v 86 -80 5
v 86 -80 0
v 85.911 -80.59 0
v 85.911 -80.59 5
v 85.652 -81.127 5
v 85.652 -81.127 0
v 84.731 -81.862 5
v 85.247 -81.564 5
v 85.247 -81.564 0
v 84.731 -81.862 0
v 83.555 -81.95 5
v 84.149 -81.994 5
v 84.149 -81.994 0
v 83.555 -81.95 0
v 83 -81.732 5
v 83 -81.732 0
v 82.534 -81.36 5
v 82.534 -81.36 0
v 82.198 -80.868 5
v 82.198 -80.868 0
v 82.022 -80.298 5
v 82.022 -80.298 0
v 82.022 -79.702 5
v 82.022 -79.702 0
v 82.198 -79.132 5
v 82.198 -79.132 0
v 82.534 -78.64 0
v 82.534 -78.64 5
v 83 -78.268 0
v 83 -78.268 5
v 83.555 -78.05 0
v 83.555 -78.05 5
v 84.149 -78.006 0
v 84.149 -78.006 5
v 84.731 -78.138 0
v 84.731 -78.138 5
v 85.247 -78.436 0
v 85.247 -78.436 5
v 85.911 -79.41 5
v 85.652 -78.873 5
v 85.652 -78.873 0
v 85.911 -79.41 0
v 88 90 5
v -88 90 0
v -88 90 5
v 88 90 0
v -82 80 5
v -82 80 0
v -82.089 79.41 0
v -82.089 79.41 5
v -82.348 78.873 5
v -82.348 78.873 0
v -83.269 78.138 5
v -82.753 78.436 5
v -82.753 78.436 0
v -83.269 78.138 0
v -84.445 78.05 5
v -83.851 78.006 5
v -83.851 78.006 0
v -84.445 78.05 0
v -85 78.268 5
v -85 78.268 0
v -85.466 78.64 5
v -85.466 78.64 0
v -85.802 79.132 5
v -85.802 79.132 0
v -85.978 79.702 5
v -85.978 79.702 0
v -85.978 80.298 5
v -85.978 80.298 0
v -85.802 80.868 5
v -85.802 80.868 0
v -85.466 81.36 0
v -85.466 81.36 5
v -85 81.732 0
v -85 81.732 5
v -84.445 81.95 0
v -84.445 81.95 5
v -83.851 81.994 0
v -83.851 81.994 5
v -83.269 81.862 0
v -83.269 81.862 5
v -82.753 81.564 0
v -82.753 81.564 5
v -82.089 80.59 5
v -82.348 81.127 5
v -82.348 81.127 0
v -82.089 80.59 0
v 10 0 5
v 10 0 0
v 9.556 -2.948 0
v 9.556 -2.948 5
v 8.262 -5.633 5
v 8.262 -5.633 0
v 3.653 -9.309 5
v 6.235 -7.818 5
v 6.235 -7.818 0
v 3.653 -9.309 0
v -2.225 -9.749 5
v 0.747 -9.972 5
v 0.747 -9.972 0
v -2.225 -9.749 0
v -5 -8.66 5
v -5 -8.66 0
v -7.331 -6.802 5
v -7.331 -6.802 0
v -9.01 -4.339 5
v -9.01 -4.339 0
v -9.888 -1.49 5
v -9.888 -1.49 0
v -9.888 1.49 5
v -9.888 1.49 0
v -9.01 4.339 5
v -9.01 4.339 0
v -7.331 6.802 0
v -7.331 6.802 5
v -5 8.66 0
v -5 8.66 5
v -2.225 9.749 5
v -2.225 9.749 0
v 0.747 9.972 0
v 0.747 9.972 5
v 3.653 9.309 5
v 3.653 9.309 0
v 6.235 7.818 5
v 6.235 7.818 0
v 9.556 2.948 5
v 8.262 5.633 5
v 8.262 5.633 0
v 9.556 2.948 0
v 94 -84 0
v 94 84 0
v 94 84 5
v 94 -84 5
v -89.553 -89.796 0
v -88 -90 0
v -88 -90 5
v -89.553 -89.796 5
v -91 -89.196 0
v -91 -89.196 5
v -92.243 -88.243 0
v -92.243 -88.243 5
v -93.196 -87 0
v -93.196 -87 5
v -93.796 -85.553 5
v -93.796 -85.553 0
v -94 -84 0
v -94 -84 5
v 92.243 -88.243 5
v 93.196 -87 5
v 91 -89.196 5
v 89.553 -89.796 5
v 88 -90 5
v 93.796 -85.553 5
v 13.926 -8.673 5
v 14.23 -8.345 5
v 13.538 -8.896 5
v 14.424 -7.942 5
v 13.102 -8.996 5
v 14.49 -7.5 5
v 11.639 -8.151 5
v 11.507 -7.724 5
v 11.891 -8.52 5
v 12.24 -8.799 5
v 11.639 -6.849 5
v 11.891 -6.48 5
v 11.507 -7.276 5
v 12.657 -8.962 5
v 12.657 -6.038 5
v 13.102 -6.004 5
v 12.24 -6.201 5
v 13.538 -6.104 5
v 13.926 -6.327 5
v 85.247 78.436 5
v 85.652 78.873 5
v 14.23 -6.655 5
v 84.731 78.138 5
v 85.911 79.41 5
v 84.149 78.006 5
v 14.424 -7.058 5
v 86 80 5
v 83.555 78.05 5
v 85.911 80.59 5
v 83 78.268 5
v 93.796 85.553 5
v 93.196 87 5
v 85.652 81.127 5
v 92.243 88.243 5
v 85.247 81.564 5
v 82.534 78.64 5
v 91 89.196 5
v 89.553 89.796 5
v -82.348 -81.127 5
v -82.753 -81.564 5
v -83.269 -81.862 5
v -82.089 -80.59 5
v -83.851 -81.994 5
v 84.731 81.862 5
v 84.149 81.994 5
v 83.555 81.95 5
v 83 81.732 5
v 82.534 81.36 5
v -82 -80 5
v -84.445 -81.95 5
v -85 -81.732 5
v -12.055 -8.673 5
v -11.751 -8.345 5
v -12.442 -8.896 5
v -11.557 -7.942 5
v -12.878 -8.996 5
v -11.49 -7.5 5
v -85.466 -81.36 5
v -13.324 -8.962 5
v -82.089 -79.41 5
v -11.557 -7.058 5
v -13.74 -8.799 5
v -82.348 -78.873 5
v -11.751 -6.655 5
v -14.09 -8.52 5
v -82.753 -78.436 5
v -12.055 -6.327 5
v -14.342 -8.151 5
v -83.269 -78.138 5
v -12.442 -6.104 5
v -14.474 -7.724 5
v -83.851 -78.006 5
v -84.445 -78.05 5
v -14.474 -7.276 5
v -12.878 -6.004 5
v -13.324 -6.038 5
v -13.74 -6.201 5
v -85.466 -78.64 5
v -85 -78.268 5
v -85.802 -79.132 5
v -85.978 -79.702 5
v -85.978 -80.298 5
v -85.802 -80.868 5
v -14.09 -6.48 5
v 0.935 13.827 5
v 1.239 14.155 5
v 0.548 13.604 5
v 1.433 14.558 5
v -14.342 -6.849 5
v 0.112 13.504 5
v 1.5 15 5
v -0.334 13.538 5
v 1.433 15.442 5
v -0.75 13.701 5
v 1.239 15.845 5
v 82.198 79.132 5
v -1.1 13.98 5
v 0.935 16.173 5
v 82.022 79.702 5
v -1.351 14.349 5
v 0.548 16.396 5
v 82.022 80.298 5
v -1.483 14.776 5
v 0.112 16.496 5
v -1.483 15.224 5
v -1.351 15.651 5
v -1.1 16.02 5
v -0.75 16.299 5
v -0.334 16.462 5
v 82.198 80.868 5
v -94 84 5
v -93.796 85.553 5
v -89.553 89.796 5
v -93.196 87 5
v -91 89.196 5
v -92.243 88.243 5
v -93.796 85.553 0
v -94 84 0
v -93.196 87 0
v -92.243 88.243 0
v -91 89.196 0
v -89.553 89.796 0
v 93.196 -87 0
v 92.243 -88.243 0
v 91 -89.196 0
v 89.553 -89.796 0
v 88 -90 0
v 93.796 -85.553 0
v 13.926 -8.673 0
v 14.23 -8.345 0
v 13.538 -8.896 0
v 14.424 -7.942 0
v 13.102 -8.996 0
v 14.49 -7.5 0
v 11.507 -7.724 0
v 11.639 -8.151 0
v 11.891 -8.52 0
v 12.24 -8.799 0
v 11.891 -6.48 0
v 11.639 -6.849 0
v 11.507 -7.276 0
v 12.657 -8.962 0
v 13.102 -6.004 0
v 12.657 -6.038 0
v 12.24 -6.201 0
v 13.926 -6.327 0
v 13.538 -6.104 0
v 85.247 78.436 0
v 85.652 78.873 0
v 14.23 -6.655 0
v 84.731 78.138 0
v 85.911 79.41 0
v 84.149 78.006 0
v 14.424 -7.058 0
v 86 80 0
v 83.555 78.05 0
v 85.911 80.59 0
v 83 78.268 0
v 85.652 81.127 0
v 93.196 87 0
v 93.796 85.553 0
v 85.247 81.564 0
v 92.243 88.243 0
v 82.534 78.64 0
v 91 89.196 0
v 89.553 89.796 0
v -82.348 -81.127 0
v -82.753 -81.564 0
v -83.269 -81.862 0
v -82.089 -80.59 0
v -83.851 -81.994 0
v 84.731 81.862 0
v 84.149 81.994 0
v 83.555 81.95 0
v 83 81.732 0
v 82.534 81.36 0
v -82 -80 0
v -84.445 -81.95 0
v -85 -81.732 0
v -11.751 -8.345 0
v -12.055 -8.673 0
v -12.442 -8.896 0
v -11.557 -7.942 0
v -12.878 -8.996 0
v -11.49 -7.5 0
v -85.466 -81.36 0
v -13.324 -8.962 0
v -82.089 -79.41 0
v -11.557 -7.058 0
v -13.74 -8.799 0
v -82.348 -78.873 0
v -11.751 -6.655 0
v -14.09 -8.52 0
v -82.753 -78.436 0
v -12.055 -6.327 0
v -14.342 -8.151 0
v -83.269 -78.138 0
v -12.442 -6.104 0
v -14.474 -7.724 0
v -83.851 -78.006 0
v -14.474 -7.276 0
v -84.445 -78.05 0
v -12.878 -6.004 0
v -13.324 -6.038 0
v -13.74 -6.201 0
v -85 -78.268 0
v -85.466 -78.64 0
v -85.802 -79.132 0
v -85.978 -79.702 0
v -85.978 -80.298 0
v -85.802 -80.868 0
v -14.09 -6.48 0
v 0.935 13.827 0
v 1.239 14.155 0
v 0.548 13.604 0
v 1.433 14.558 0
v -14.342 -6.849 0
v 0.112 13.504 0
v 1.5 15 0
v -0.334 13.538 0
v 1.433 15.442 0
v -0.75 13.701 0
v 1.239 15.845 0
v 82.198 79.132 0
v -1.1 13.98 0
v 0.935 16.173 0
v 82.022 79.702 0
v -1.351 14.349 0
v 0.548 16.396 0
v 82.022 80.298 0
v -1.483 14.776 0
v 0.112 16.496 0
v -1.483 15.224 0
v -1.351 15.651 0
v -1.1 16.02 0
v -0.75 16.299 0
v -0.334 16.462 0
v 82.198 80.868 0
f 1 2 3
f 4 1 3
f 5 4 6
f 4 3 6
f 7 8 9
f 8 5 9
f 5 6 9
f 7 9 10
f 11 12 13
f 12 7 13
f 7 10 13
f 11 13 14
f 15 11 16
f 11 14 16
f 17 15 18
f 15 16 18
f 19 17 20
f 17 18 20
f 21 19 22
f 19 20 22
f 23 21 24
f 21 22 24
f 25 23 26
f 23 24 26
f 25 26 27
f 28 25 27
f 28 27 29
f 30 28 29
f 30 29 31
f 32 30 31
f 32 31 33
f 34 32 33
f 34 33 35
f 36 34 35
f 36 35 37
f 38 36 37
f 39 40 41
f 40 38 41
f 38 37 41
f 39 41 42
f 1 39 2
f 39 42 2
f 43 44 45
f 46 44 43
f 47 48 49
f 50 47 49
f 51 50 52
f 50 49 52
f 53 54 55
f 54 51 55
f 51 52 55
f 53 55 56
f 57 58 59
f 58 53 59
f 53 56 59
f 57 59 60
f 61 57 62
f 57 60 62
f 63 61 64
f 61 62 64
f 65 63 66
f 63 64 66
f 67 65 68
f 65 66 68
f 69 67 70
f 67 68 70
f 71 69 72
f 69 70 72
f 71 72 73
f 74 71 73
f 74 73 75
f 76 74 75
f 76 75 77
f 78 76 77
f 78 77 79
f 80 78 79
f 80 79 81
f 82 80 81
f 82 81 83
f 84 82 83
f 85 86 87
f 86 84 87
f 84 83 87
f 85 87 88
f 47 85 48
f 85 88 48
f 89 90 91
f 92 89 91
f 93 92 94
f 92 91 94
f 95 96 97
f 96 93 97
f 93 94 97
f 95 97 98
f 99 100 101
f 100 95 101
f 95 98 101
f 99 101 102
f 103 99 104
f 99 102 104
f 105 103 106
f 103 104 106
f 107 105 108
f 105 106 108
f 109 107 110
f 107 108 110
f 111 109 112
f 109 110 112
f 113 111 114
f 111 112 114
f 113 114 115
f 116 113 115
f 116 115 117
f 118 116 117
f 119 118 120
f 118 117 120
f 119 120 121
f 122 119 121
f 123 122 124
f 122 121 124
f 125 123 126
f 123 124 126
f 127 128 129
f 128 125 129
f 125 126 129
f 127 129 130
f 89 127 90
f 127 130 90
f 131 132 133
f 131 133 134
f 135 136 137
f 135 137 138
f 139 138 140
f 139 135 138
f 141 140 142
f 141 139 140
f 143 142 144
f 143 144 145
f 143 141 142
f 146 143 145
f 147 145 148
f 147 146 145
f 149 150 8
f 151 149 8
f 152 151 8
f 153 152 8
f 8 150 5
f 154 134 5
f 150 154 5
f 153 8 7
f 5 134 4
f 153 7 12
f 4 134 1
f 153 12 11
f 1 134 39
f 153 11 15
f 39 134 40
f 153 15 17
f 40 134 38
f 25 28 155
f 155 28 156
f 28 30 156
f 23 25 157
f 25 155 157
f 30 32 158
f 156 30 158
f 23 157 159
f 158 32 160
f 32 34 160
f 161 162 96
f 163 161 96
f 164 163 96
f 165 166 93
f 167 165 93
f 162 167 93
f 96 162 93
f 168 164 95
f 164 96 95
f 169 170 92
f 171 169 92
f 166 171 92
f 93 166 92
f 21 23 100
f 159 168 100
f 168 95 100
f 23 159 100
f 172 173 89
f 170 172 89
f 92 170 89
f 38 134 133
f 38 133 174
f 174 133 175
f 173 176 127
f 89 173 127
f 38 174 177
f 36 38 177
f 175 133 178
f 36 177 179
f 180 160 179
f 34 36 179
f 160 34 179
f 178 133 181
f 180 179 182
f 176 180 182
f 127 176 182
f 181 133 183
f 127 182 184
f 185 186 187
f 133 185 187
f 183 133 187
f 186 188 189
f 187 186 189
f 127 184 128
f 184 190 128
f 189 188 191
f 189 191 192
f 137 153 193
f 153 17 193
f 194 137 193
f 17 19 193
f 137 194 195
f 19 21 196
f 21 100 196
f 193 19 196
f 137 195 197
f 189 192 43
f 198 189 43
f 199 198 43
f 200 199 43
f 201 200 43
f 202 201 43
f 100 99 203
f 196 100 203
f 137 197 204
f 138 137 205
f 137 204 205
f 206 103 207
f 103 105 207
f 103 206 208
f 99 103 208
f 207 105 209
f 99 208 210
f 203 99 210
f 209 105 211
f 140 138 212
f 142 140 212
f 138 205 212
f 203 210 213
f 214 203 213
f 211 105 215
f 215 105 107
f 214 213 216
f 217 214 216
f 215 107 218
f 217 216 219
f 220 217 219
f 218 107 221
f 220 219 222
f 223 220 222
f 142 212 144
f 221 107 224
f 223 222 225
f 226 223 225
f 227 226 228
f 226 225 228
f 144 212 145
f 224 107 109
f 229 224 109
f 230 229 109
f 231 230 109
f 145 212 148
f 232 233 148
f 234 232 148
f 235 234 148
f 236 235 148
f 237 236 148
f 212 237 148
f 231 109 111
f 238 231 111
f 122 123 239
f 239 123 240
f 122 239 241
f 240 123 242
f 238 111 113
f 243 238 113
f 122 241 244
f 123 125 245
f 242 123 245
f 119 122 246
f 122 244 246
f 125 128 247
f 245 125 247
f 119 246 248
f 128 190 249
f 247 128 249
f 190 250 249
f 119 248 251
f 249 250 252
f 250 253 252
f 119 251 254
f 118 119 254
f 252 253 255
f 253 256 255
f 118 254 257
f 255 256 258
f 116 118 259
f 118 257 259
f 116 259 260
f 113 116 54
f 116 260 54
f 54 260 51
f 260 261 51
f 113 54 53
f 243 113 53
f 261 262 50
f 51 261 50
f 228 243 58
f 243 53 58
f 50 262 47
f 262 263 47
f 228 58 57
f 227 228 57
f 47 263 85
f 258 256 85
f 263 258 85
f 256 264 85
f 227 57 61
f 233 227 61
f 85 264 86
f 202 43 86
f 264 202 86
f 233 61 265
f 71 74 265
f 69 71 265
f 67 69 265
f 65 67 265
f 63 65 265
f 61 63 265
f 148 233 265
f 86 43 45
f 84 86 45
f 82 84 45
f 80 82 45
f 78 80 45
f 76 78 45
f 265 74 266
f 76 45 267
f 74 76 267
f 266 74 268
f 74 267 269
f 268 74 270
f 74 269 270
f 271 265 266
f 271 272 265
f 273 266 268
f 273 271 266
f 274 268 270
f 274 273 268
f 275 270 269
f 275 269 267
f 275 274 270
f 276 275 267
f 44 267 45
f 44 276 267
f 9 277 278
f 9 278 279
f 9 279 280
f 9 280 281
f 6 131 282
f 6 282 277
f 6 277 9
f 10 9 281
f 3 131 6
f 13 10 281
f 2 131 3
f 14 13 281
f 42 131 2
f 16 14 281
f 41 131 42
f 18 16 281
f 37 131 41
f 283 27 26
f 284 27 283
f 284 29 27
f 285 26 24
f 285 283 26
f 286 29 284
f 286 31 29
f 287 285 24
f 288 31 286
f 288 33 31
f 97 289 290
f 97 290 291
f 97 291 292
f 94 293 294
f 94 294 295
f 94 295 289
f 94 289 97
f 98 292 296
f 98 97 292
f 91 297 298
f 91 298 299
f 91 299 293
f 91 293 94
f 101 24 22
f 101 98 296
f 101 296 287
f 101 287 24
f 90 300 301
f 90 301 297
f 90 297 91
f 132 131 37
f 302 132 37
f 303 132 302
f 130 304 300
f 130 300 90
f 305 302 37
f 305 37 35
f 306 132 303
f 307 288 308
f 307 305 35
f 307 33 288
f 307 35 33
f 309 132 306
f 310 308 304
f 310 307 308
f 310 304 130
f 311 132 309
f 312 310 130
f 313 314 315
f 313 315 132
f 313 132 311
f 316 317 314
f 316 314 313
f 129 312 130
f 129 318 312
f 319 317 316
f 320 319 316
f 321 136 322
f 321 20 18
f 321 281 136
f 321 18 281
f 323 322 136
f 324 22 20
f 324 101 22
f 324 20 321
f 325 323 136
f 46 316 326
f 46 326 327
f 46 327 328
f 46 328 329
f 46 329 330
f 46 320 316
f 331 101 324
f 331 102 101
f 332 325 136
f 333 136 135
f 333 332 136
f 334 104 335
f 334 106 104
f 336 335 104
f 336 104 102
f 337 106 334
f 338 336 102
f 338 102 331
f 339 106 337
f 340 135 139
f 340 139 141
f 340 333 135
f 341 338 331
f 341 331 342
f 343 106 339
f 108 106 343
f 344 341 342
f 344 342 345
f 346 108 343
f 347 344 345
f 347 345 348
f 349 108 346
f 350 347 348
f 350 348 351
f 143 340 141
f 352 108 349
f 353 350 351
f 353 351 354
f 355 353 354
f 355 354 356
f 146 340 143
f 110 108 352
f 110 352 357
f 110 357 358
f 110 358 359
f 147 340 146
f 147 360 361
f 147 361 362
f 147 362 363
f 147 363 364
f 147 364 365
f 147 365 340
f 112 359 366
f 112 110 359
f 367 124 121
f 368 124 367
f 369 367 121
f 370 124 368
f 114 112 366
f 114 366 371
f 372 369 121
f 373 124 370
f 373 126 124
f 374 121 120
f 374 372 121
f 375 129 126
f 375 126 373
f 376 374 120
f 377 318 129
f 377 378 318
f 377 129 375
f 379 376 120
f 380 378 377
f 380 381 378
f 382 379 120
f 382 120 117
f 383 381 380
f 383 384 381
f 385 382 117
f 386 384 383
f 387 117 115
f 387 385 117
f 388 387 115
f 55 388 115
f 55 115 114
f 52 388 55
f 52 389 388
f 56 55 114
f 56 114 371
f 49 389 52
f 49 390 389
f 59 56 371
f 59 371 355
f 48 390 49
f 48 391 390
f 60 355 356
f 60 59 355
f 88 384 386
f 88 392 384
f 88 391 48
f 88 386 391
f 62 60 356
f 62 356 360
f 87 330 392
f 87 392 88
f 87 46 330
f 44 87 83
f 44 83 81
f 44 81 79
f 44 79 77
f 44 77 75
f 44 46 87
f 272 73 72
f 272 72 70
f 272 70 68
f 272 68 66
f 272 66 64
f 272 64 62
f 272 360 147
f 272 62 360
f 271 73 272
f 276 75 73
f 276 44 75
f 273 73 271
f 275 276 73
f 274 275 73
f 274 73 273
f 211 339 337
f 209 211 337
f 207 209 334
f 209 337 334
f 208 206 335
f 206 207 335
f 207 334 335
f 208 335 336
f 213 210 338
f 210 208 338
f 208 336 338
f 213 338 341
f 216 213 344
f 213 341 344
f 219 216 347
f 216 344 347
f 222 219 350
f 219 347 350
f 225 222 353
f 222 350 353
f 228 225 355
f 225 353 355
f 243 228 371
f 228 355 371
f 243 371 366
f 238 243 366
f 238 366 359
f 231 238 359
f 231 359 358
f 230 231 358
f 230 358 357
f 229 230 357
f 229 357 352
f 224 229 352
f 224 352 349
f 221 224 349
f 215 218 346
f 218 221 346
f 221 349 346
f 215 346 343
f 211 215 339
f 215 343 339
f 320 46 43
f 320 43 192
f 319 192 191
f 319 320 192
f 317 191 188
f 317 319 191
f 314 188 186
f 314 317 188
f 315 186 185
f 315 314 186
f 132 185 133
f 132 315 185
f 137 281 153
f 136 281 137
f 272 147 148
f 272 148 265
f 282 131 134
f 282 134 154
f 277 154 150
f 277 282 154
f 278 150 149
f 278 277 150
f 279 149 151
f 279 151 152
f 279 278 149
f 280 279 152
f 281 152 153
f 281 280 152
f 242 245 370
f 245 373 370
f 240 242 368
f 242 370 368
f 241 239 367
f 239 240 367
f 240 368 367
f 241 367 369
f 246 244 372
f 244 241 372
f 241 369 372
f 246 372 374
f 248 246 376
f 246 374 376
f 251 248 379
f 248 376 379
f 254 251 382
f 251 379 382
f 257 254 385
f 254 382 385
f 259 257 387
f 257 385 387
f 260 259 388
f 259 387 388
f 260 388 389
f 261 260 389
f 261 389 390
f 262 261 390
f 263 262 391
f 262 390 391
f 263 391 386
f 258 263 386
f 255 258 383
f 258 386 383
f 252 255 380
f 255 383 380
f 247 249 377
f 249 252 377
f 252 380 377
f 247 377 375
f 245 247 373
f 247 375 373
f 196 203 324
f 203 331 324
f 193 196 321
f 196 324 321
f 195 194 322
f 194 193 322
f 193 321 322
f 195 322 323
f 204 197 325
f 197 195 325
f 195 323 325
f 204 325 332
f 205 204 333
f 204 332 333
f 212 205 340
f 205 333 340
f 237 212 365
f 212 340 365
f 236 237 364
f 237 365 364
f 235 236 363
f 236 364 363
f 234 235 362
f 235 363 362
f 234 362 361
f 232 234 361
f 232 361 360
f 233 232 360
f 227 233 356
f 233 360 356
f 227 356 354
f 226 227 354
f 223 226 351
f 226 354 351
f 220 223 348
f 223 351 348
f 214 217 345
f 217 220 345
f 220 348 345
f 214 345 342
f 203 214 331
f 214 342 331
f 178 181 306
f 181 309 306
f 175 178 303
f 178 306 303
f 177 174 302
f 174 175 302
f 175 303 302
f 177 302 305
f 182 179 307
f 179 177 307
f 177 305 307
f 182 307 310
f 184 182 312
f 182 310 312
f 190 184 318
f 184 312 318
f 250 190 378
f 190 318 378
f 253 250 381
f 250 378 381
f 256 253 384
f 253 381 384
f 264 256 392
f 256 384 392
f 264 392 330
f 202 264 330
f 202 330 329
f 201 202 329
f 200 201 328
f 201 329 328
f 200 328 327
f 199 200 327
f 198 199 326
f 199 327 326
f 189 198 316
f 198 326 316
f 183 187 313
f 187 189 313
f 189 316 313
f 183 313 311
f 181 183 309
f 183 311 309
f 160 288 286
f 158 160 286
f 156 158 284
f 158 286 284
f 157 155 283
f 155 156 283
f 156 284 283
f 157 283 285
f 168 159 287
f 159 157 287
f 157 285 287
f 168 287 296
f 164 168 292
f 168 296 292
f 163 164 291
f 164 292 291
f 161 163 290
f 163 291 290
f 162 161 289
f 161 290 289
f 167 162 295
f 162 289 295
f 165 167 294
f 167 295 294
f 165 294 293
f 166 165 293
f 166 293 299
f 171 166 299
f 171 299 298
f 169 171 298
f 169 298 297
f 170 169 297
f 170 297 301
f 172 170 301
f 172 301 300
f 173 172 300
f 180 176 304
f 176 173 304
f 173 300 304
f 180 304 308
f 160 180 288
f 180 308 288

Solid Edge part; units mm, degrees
sketch "Sketch1" plane through (0, 0, 0) normal (0, 0, 1) x (1, 0, 0)
  circle A0 centre (0, 0) radius 10
  circle A1 centre (-12.9904, -7.5) radius 1.5
  circle A2 centre (12.9904, -7.5) radius 1.5
  circle A3 centre (-84, -80) radius 2
  circle A4 centre (-84, 80) radius 2
  circle A5 centre (84, 80) radius 2
  circle A6 centre (84, -80) radius 2
  circle A7 centre (0, 15) radius 1.5
  arc A8 (-94, 84) -> (-88, 90) centre (-88, 84) cw
  line L0 (-88, 90) -> (88, 90)
  arc A9 (88, 90) -> (94, 84) centre (88, 84) cw
  line L1 (94, 84) -> (94, -84)
  arc A10 (94, -84) -> (88, -90) centre (88, -84) cw
  line L2 (88, -90) -> (-88, -90)
  arc A11 (-88, -90) -> (-94, -84) centre (-88, -84) cw
  line L3 (-94, -84) -> (-94, 84)
  dimension "D1" = 180
  dimension "D2" = 188
  dimension "D3" = 6
  dimension "D4" = 10
  dimension "D5" = 10
  dimension "D6" = 10
  dimension "D7" = 10
  dimension "D8" = 4
  dimension "D9" = 20
  dimension "D10" = 3
  dimension "D11" = 30
extrude "Protrusion1" add sketch "Sketch1" along normal blind 5
